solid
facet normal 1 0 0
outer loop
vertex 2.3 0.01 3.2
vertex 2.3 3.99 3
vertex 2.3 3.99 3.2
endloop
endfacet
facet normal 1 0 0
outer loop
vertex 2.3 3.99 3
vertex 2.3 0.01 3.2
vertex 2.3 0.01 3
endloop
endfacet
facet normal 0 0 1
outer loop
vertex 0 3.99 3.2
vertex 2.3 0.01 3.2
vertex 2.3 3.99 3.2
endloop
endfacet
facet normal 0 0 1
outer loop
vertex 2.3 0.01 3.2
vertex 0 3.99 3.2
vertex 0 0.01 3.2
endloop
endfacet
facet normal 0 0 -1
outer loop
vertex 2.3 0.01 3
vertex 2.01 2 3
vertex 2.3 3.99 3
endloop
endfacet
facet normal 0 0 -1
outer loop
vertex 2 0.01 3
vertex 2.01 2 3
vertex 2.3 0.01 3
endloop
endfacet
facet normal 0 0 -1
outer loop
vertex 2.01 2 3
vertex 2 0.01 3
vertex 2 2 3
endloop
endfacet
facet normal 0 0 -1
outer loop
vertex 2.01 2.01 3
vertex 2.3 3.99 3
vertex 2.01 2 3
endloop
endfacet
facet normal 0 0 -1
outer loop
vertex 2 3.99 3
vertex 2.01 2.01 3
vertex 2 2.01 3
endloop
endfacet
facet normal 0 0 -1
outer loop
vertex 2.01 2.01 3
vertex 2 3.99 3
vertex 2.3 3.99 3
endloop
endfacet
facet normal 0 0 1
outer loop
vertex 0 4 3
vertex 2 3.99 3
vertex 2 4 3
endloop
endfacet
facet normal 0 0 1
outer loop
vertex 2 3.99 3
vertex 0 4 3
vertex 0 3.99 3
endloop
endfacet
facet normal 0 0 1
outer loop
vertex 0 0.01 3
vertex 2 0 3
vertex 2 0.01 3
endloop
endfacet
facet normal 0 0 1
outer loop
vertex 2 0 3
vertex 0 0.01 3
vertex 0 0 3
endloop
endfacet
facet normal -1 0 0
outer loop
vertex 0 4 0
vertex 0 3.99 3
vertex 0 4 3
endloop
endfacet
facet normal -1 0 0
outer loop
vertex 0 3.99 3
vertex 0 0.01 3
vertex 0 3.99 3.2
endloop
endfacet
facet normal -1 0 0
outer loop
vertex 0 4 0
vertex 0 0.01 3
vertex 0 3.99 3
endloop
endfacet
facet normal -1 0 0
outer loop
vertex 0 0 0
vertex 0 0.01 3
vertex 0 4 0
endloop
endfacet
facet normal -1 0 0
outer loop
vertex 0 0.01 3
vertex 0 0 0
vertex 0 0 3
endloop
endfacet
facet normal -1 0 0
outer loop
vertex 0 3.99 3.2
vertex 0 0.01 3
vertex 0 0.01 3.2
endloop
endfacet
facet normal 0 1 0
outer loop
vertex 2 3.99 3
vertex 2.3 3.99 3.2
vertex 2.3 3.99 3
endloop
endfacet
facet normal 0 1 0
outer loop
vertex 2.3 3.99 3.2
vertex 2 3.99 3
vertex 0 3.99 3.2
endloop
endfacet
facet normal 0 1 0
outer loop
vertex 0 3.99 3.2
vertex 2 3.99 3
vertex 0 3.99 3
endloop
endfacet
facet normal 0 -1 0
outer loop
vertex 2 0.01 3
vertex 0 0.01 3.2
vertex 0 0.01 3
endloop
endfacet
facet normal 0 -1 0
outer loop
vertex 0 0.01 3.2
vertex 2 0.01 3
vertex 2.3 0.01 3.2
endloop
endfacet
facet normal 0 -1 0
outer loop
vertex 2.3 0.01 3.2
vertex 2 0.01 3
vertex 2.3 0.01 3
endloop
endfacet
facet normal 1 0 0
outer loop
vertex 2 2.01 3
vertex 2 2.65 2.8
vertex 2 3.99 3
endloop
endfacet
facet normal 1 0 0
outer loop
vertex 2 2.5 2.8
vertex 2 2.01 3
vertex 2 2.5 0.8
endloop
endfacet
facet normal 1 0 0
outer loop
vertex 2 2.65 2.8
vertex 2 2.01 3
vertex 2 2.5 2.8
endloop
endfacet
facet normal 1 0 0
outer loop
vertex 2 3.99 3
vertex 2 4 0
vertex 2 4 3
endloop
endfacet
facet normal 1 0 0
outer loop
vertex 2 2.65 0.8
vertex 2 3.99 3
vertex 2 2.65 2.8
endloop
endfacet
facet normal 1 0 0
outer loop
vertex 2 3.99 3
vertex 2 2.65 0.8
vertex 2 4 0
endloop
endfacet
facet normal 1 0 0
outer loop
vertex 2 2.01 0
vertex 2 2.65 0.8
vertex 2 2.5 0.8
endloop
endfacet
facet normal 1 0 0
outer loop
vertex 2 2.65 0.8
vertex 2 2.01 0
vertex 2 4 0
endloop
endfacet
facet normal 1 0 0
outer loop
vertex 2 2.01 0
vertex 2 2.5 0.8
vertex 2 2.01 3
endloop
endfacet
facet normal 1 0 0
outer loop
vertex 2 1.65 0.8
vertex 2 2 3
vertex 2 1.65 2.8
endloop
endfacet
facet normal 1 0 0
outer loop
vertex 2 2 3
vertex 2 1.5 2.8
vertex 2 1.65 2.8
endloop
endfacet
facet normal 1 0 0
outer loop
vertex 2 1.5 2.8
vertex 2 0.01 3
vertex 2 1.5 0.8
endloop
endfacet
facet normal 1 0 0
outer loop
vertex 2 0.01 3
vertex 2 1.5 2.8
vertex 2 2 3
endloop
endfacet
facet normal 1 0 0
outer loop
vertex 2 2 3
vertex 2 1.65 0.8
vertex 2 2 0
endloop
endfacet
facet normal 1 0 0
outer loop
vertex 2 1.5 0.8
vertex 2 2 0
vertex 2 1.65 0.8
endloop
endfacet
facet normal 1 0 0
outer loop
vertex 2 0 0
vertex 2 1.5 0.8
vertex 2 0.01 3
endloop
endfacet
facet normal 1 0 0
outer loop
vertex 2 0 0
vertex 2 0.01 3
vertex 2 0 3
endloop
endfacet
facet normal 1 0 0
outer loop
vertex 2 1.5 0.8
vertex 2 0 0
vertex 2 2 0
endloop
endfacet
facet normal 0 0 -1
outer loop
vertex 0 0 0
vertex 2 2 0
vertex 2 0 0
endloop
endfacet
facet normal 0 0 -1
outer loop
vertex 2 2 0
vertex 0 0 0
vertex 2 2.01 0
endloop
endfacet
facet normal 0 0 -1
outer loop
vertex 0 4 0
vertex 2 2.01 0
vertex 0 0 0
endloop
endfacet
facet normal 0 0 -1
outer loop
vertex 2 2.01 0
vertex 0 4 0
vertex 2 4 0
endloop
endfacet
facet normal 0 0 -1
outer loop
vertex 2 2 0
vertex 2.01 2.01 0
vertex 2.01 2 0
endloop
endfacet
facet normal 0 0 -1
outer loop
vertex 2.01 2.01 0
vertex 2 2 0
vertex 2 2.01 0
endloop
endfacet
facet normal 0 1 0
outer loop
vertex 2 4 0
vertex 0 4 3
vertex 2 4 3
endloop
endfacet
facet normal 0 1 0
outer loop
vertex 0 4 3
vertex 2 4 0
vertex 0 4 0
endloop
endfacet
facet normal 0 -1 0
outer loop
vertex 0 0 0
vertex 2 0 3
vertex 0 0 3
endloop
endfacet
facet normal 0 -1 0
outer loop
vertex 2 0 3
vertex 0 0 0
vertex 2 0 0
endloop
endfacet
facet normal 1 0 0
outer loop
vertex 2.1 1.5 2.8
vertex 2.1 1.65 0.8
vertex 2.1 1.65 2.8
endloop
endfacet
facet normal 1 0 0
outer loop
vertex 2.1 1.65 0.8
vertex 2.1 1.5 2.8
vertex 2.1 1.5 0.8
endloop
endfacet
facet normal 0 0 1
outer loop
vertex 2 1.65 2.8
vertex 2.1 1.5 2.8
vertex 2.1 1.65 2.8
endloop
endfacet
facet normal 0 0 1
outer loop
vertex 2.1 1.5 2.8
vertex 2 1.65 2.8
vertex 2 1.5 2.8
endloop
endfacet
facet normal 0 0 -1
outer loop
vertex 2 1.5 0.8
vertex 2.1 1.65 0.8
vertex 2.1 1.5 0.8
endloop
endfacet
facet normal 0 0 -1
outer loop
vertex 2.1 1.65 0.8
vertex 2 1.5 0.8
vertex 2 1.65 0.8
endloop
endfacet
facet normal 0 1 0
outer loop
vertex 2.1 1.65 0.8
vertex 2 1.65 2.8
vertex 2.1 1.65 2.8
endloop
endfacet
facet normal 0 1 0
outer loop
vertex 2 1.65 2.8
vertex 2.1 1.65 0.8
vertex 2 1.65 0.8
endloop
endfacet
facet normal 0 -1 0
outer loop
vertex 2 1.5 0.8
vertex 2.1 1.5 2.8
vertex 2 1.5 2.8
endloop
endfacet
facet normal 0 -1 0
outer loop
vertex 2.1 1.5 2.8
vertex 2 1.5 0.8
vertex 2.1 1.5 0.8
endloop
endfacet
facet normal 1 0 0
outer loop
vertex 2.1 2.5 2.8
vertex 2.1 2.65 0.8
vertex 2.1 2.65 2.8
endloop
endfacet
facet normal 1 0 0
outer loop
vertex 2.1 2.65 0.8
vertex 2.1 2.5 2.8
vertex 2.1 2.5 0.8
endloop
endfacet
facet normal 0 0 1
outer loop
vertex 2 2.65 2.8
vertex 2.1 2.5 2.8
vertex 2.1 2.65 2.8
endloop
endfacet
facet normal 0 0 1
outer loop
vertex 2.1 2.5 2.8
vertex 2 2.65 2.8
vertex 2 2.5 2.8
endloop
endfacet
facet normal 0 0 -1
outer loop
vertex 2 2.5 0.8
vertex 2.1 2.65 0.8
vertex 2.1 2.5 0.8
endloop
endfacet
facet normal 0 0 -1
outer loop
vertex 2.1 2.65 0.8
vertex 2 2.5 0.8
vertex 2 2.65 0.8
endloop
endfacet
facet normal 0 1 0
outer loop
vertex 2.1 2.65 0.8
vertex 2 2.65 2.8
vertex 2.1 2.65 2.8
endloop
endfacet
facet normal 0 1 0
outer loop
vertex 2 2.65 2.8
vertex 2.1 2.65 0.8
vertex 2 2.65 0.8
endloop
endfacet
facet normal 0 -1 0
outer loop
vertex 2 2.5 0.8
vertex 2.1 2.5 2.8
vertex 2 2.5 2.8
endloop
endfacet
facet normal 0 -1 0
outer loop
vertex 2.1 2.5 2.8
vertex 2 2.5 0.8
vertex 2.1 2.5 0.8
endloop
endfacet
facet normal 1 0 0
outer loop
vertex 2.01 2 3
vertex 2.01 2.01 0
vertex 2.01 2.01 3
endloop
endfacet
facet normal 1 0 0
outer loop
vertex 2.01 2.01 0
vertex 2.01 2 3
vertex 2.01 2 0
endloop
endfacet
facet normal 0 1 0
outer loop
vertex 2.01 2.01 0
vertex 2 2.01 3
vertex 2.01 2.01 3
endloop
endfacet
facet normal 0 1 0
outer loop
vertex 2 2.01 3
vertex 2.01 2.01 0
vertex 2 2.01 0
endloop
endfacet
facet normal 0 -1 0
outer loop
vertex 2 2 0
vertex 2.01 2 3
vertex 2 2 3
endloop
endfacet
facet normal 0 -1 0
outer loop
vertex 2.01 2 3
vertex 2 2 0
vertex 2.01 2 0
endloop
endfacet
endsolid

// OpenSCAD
module Base_cabinet_Gray(){

    translate([0,0.01,3])
    color("#c2c2c2")
    cube([2.3,3.98,0.2]);

    color("#9e9e9e")
    cube([2,4,3]);

    translate([2,1.5,0.8])
    color("#c2c2c2")
    cube([0.1,0.15,2]);


    translate([2,2.5,0.8])
    color("#c2c2c2")
    cube([0.1,0.15,2]);


    translate([2,2,0])
    color("#000000")
    cube([0.01,0.01,3]);

}

Base_cabinet_Gray();
